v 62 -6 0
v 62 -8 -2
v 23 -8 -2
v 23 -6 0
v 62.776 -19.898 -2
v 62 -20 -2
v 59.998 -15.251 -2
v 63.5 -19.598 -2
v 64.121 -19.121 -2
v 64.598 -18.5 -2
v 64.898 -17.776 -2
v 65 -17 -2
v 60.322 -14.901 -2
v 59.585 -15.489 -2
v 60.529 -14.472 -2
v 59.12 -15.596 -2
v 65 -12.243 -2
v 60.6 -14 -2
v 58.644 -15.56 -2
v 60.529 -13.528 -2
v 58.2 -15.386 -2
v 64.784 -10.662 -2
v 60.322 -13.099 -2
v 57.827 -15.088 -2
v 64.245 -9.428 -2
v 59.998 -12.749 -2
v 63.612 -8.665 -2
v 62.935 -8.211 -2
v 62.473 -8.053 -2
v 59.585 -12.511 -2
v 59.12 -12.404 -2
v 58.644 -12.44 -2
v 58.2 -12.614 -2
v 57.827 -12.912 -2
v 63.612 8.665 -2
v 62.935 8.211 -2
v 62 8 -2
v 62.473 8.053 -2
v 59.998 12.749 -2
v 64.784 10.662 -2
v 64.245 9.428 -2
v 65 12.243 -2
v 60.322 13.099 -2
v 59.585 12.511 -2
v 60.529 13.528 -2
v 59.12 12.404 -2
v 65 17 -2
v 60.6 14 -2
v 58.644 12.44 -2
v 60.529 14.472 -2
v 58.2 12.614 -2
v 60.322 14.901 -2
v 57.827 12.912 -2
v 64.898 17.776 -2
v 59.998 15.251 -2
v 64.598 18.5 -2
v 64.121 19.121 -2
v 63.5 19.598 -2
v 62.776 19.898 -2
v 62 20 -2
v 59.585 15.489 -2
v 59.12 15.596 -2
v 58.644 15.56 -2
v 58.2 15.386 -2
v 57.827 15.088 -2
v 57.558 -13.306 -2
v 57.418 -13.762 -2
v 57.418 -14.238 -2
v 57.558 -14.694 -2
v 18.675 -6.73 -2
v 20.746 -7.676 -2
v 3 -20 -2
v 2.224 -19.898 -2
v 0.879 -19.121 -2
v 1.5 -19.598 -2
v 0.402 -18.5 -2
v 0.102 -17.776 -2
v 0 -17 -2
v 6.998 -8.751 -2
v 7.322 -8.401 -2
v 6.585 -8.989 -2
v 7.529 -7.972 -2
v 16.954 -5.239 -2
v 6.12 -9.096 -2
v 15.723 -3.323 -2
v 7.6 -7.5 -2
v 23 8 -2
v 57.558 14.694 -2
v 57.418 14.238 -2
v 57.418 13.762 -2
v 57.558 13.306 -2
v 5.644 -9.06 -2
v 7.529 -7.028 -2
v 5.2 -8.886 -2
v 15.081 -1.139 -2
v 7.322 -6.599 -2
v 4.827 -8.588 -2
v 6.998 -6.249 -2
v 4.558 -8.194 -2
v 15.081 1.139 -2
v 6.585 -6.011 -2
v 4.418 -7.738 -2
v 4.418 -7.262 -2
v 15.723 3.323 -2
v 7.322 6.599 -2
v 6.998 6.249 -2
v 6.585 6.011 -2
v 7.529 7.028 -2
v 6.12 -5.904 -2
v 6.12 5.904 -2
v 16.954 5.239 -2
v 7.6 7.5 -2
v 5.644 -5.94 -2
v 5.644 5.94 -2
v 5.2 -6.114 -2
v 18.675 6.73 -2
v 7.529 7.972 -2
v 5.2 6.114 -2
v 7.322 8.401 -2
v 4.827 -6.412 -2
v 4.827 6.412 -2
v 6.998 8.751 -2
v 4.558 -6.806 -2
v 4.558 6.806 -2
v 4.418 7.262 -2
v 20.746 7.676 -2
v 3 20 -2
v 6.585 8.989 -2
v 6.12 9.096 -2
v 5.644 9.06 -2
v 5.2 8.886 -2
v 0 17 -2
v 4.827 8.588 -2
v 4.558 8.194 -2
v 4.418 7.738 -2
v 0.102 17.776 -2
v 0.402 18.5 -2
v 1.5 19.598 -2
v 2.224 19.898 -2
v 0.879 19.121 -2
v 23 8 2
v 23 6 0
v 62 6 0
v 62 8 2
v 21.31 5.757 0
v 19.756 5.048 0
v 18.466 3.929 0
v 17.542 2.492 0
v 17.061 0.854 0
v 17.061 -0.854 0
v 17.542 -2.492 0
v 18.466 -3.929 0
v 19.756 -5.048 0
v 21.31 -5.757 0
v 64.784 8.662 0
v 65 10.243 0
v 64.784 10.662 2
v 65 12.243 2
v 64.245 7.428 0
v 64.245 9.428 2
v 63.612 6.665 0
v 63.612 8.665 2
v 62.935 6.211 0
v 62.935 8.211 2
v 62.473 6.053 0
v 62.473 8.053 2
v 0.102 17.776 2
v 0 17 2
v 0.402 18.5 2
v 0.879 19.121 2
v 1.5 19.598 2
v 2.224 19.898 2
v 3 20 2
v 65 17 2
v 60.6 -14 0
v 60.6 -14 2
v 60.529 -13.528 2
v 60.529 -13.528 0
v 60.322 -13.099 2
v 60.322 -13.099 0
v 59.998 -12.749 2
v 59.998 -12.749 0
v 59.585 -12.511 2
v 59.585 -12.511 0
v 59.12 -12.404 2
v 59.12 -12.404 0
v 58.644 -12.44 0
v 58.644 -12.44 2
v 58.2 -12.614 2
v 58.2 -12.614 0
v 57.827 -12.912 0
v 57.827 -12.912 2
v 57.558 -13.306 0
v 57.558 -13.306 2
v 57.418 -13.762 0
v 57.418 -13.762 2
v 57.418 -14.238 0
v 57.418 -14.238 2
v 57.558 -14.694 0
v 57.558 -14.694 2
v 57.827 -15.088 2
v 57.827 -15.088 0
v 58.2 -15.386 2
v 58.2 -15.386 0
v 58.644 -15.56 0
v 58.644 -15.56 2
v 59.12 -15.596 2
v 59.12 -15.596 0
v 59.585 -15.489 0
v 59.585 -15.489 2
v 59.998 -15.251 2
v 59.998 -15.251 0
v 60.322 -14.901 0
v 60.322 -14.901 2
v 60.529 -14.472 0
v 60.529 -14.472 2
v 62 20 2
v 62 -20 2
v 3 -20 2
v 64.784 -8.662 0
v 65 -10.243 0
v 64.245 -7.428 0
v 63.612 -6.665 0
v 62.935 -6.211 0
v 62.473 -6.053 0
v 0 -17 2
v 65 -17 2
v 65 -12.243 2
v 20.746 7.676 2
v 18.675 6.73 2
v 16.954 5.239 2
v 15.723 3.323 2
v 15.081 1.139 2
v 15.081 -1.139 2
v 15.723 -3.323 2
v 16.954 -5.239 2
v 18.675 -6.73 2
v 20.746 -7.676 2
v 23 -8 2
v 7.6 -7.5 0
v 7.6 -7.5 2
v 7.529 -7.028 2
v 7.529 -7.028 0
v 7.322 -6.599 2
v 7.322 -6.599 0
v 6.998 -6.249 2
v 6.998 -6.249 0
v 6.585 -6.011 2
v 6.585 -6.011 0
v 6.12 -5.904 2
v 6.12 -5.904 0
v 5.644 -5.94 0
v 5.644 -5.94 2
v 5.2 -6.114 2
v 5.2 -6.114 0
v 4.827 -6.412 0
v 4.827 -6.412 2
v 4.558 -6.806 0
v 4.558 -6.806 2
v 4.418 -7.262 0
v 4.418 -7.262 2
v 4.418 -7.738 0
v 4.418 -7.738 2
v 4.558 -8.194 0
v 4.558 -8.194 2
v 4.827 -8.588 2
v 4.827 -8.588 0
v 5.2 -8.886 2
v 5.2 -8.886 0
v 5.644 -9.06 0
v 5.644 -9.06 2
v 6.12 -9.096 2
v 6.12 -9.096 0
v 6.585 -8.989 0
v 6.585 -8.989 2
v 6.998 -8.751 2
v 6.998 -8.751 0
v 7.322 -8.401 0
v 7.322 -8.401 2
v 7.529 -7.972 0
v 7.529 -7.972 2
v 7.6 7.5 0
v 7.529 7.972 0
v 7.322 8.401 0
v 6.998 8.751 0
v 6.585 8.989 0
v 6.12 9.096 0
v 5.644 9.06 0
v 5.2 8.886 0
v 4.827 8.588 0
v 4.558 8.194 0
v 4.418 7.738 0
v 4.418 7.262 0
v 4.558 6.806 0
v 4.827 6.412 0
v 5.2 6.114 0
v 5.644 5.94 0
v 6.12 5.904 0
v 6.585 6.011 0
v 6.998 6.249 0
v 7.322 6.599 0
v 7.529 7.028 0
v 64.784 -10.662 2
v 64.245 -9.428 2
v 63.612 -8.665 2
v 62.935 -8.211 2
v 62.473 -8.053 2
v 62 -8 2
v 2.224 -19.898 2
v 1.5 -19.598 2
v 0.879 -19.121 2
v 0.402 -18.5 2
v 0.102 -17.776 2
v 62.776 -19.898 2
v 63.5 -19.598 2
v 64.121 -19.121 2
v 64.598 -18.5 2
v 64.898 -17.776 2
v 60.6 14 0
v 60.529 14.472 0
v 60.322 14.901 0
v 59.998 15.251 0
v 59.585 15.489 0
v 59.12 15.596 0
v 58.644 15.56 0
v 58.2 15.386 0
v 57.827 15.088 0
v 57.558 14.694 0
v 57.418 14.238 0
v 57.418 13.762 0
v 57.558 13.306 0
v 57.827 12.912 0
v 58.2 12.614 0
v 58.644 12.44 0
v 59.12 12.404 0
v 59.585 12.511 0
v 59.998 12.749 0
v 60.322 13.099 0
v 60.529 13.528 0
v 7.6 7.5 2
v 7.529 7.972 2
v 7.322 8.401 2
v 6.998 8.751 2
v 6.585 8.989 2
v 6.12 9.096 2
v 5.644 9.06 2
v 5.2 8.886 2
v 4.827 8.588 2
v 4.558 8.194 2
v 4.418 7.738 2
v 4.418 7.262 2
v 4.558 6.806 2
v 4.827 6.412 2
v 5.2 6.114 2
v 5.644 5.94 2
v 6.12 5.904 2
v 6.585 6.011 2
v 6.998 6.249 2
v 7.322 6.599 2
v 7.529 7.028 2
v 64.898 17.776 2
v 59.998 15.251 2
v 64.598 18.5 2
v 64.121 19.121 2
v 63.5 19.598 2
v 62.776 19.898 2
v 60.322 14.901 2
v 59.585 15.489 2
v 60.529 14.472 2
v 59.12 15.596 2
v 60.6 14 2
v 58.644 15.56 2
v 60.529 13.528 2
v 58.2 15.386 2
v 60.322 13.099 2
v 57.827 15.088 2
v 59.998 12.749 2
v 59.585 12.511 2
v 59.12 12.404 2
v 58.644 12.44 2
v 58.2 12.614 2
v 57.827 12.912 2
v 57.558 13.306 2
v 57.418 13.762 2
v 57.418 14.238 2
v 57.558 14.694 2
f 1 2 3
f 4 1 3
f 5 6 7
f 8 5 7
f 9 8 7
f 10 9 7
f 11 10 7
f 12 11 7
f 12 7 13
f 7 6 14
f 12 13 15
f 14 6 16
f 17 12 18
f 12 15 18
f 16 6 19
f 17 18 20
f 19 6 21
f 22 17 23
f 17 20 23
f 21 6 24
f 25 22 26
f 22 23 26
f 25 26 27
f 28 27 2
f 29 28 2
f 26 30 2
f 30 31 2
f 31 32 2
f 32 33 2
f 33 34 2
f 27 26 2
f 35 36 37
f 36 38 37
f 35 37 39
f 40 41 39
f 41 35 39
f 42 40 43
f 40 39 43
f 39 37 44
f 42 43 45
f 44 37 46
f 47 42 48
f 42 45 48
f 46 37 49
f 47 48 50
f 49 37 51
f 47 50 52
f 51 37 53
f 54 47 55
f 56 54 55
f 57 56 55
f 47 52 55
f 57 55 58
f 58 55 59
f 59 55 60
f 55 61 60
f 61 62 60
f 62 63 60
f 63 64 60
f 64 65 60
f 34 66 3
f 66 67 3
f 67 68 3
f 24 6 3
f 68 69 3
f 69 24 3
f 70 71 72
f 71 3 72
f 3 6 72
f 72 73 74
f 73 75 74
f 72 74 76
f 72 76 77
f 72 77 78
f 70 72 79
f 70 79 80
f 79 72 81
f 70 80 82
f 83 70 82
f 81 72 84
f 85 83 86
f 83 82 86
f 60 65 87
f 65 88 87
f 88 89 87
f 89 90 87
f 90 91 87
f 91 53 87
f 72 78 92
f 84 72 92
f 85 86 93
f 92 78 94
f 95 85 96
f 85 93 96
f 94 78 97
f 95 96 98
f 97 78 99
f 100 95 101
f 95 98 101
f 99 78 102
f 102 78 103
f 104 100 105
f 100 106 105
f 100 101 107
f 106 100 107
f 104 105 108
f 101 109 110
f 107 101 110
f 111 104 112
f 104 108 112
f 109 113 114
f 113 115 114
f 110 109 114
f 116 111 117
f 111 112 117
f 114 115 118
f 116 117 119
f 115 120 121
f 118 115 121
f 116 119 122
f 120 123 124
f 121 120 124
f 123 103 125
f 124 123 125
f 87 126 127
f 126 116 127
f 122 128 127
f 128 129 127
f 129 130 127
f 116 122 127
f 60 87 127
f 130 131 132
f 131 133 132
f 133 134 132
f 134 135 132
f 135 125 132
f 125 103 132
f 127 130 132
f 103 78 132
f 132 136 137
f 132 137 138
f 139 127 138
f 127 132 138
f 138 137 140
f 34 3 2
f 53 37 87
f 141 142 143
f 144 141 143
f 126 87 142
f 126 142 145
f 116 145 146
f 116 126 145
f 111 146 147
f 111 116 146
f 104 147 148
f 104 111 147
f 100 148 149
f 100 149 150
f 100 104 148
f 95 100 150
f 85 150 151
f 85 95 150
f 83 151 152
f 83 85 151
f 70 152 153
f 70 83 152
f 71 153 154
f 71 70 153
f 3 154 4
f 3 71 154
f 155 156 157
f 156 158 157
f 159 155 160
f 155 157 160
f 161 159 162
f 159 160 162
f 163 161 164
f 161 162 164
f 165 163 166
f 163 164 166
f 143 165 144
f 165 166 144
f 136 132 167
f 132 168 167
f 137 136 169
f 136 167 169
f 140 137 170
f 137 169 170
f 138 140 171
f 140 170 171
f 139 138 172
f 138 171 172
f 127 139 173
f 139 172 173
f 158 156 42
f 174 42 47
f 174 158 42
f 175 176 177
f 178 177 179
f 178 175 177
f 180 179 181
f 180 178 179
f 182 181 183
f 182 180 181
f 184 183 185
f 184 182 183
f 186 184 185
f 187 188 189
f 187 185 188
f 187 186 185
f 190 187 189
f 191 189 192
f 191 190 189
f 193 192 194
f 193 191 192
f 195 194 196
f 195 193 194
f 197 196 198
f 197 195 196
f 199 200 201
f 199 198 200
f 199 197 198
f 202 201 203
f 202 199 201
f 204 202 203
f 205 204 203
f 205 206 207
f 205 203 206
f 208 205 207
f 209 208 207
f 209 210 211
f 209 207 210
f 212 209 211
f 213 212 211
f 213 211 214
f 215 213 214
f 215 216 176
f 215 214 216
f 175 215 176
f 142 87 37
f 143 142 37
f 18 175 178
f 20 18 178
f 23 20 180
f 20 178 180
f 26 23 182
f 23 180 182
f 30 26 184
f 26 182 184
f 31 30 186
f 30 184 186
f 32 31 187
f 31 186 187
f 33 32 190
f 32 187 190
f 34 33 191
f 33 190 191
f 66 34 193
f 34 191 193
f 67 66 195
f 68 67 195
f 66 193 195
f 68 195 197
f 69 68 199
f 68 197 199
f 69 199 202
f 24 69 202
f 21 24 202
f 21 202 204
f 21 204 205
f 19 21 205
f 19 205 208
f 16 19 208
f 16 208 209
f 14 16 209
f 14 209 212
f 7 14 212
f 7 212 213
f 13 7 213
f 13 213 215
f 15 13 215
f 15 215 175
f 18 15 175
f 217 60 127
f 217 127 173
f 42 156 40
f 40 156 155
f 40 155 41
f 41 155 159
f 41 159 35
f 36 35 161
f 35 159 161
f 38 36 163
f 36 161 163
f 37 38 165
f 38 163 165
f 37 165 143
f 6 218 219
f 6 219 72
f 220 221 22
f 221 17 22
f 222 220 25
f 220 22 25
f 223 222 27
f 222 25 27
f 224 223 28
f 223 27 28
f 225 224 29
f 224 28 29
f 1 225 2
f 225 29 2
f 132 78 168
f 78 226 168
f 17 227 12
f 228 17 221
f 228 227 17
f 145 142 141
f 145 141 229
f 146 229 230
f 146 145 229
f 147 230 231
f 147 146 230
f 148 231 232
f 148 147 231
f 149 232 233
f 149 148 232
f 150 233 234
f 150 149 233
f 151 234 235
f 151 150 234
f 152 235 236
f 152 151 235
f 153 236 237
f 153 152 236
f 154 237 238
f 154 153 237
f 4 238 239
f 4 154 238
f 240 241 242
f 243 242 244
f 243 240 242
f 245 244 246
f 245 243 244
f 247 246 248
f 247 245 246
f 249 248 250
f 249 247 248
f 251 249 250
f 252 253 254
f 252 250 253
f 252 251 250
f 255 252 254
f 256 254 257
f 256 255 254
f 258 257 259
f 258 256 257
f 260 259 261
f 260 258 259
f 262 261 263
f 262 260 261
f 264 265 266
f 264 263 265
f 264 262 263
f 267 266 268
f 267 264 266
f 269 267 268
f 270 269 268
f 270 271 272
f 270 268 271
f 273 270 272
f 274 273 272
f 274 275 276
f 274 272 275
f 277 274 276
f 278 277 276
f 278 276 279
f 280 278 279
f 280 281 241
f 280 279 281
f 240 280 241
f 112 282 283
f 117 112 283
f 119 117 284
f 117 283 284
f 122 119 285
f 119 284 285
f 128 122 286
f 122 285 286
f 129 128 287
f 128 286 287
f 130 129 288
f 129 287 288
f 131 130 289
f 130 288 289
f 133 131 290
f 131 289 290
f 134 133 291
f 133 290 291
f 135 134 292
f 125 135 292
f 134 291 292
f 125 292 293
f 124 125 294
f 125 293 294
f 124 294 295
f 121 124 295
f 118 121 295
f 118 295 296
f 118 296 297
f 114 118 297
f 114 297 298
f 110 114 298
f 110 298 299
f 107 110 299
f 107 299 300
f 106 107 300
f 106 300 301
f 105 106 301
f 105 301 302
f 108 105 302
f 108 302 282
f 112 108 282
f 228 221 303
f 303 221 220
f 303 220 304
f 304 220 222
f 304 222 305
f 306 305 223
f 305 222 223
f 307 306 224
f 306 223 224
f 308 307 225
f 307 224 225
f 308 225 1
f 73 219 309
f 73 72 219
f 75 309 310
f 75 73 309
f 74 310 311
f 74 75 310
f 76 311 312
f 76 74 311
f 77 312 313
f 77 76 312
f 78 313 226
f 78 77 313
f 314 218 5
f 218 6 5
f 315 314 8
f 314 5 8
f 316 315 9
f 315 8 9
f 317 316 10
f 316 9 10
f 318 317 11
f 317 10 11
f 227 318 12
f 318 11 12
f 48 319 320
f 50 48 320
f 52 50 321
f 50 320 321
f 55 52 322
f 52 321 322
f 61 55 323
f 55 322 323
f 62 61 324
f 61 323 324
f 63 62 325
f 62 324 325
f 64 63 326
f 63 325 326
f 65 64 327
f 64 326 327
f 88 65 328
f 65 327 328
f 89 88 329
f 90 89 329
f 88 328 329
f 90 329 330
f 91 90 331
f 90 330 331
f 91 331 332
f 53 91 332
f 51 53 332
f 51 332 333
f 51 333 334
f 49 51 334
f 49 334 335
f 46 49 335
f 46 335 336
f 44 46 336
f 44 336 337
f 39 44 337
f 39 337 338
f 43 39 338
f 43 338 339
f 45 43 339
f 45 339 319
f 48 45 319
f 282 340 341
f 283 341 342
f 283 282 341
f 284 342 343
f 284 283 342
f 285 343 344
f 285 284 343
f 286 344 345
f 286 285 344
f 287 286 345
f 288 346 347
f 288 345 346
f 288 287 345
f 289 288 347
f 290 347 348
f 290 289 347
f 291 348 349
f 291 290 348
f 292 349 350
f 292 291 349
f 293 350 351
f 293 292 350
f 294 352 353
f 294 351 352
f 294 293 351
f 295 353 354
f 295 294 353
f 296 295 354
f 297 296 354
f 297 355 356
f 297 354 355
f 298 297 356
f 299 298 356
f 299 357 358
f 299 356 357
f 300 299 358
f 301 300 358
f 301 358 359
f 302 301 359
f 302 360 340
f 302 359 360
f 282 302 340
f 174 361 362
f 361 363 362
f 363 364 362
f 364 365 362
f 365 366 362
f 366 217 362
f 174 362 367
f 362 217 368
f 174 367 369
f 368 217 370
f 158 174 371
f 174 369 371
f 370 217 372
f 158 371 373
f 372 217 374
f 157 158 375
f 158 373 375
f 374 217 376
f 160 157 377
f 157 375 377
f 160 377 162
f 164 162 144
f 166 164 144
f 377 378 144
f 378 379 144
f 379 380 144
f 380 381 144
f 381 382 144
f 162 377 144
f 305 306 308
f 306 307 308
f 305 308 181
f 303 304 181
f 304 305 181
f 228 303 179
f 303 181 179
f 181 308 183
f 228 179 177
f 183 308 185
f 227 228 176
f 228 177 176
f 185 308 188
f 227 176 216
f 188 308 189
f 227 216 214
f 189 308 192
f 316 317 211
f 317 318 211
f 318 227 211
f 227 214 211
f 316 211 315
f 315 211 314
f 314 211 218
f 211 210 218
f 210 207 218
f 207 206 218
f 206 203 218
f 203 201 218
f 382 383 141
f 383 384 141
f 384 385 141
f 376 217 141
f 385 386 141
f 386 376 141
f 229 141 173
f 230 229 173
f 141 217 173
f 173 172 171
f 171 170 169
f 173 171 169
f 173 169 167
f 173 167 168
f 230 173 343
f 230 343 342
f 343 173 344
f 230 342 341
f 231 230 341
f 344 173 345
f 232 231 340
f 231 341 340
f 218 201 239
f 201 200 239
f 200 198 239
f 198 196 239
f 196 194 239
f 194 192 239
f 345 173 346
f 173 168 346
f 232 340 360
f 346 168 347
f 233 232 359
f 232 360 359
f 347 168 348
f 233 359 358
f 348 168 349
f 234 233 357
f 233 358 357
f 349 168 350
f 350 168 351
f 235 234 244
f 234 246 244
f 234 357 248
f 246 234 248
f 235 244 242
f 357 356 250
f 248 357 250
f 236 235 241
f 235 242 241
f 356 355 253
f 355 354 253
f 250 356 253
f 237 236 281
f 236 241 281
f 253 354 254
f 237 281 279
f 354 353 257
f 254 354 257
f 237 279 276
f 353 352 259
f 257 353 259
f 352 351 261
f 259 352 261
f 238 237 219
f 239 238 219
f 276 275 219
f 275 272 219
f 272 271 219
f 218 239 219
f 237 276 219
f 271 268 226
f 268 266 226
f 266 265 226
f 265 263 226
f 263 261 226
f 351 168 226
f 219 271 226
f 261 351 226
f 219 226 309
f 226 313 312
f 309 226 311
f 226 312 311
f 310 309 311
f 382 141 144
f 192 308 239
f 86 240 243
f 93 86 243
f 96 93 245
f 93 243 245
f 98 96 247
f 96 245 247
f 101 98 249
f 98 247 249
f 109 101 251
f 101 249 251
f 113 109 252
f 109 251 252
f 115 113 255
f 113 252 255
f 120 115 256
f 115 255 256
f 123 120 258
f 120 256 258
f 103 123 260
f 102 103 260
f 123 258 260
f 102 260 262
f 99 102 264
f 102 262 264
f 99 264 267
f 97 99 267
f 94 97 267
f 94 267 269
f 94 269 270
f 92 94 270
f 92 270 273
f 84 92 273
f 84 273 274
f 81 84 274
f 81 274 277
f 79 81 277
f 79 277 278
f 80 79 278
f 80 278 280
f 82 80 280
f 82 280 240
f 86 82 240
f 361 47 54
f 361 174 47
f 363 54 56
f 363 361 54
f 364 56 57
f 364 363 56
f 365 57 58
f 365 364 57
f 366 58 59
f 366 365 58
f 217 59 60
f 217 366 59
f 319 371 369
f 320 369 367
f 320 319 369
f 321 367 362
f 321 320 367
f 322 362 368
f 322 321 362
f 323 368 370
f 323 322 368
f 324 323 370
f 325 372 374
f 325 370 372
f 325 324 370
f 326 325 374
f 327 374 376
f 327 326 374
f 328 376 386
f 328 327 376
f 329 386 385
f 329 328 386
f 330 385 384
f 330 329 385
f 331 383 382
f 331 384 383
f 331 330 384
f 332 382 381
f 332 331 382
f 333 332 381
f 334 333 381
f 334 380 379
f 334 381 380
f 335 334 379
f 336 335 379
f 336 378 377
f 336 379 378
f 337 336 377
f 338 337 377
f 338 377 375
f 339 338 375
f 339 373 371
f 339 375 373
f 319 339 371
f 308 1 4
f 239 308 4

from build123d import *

# Parameters (mm, degrees)
PAD_DEPTH         = 65
SKETCH009_R       = 1.6
POCKET_DEPTH      = 2.001
POCKET_DEPTH_BACK = 2.001
SKETCH004_R       = 8
SKETCH003_R       = 6
SKETCH005_R       = 8
FILLET_R          = 3
FILLET001_R       = 3


with BuildPart() as part:
    # Sketch → Pad (new body)
    with BuildSketch(Plane.YZ):
        Polygon((0, 2), (-20, 2), (-20, 0), (-20, -2), (0, -2), (20, -2), (20, 0), (20, 2), align=None)
    extrude(amount=PAD_DEPTH)

    # Sketch009 → Pocket (cut, two sides)
    with BuildSketch(Plane.XY) as pocket_sk:
        with Locations((6, 7.5)):
            Circle(SKETCH009_R)
        with Locations((6, -7.5)):
            Circle(SKETCH009_R)
        with Locations((59, -14)):
            Circle(SKETCH009_R)
        with Locations((59, 14)):
            Circle(SKETCH009_R)
    extrude(amount=-POCKET_DEPTH, mode=Mode.SUBTRACT)
    extrude(pocket_sk.sketch, amount=POCKET_DEPTH_BACK, mode=Mode.SUBTRACT)

    # Sketch004 (on DatumPlane) → SubtractiveLoft section 0
    with BuildSketch(Plane.XY.offset(2)):
        with Locations((23, 0)):
            Circle(SKETCH004_R)
    # Sketch003 → SubtractiveLoft section 1
    with BuildSketch(Plane.XY):
        with Locations((23, 0)):
            Circle(SKETCH003_R)
    # Sketch005 (on DatumPlane) → SubtractiveLoft section 2
    with BuildSketch(Plane.XY.offset(-2)):
        with Locations((23, 0)):
            Circle(SKETCH005_R)
    loft(ruled=True, mode=Mode.SUBTRACT)

    # Sketch007 (on DatumPlane) → SubtractiveLoft001 section 0
    with BuildSketch(Plane.XY.offset(2)):
        Polygon((23, 0), (23, 8), (123, 8), (123, -8), (23, -8), align=None)
    # Sketch006 → SubtractiveLoft001 section 1
    with BuildSketch(Plane.XY):
        Polygon((23, 0), (23, 6), (123, 6), (123, -6), (23, -6), align=None)
    # Sketch008 (on DatumPlane) → SubtractiveLoft001 section 2
    with BuildSketch(Plane.XY.offset(-2)):
        Polygon((23, 8), (23, 0), (23, -8), (123, -8), (123, 8), align=None)
    loft(ruled=True, mode=Mode.SUBTRACT)

    # Fillet
    fillet_edges = [part.edges().sort_by_distance(p)[0] for p in [
        (65, -20, 1),
        (0, -20, 1),
        (0, 20, 1),
        (65, 20, 1),
    ]]
    fillet(fillet_edges, radius=FILLET_R)

    # Fillet001
    fillet001_edges = [part.edges().sort_by_distance(p)[0] for p in [
        (65, -7, 1),
        (65, -7, -1),
        (65, 7, -1),
        (65, 7, 1),
    ]]
    fillet(fillet001_edges, radius=FILLET001_R)


solid = part.part
